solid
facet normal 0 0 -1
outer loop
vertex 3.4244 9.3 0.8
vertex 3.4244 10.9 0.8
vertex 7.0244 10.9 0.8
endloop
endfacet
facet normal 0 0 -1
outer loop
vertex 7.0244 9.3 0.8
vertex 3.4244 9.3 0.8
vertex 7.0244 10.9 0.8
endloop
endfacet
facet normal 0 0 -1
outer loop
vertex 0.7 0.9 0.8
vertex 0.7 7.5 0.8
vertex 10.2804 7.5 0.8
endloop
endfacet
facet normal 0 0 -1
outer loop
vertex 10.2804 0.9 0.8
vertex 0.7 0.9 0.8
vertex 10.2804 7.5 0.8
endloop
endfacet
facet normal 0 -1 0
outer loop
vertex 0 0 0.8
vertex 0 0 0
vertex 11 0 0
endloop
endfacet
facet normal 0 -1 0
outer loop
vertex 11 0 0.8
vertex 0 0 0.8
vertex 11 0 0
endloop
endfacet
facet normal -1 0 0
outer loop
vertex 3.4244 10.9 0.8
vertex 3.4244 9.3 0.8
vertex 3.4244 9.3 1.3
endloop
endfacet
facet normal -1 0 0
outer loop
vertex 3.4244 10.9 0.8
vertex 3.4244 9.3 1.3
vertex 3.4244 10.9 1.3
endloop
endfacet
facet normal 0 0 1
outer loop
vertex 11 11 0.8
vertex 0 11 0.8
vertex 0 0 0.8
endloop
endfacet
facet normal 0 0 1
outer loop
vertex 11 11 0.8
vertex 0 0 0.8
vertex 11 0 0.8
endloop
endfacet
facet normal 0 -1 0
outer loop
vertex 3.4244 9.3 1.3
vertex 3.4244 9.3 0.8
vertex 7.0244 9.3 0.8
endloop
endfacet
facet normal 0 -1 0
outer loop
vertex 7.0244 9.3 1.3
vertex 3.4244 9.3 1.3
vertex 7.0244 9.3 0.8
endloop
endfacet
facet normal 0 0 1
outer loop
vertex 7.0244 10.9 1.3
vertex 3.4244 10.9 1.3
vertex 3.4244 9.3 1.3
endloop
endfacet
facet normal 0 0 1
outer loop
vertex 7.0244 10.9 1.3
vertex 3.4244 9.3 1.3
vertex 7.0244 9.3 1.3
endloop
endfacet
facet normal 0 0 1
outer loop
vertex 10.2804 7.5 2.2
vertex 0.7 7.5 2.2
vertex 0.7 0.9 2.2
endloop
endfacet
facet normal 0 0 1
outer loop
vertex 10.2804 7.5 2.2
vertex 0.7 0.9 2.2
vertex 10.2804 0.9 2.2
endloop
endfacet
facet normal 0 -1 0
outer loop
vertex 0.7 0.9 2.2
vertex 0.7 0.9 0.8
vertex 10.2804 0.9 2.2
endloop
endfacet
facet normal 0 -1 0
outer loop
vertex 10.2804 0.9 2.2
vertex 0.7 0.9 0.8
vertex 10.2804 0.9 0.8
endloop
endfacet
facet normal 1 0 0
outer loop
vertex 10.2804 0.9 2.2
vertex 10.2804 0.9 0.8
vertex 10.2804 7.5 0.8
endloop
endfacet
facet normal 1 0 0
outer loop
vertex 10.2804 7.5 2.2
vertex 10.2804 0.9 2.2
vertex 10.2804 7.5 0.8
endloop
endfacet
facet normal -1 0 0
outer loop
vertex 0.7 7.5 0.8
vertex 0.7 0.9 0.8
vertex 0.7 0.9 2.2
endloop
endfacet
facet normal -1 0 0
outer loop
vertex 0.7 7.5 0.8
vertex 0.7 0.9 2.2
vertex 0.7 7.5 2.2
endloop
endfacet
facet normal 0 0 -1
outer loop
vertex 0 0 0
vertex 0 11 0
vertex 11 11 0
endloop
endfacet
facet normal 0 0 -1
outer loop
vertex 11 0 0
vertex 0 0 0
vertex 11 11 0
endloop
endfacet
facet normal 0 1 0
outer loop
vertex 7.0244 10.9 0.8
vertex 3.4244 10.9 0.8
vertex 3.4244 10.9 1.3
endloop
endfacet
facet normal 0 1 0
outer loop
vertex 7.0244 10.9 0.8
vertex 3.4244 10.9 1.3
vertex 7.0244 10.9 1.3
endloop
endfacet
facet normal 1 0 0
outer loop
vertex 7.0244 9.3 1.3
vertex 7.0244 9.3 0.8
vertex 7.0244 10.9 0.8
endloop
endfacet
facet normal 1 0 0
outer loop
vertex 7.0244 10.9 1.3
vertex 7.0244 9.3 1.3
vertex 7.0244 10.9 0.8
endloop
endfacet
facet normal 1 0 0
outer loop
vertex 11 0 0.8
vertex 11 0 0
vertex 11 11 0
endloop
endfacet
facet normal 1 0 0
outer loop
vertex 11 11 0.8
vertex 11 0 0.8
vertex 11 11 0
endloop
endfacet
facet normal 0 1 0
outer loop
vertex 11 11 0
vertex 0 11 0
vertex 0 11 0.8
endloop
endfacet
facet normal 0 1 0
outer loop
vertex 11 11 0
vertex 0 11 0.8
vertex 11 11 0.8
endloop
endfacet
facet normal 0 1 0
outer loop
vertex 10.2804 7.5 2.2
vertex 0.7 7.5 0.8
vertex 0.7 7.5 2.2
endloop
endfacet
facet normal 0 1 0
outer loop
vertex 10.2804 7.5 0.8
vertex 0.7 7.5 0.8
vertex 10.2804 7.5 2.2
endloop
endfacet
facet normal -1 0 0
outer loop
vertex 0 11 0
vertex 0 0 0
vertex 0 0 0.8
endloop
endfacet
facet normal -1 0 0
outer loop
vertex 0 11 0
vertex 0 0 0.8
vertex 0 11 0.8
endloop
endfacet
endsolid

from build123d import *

# Parameters (mm, degrees)
SKETCH_W         = 11
SKETCH_H         = 11
EXTRUDE001_DEPTH = 0.8
SKETCH001_W      = 9.580367
SKETCH001_H      = 6.6
EXTRUDE_DEPTH    = 1.4
SKETCH002_W      = 3.6
SKETCH002_H      = 1.6
EXTRUDE002_DEPTH = 0.5


with BuildPart() as extrude001:
    # Sketch → Extrude001 (new body)
    with BuildSketch(Plane.XY):
        with Locations((5.5, 5.5)):
            Rectangle(SKETCH_W, SKETCH_H)
    extrude(amount=EXTRUDE001_DEPTH)


with BuildPart() as extrude_body:
    # Sketch001 (on Face6 of Extrude001) → Extrude (new body)
    with BuildSketch(Plane.XY.offset(0.8)):
        with Locations((5.490183, 4.2)):
            Rectangle(SKETCH001_W, SKETCH001_H)
    extrude(amount=EXTRUDE_DEPTH)


with BuildPart() as extrude002:
    # Sketch002 (on Face6 of Extrude001) → Extrude002 (new body)
    with BuildSketch(Plane.XY.offset(0.8)):
        with Locations((5.224448, 10.1)):
            Rectangle(SKETCH002_W, SKETCH002_H)
    extrude(amount=EXTRUDE002_DEPTH)


solid = Compound([extrude001.part, extrude_body.part, extrude002.part])
